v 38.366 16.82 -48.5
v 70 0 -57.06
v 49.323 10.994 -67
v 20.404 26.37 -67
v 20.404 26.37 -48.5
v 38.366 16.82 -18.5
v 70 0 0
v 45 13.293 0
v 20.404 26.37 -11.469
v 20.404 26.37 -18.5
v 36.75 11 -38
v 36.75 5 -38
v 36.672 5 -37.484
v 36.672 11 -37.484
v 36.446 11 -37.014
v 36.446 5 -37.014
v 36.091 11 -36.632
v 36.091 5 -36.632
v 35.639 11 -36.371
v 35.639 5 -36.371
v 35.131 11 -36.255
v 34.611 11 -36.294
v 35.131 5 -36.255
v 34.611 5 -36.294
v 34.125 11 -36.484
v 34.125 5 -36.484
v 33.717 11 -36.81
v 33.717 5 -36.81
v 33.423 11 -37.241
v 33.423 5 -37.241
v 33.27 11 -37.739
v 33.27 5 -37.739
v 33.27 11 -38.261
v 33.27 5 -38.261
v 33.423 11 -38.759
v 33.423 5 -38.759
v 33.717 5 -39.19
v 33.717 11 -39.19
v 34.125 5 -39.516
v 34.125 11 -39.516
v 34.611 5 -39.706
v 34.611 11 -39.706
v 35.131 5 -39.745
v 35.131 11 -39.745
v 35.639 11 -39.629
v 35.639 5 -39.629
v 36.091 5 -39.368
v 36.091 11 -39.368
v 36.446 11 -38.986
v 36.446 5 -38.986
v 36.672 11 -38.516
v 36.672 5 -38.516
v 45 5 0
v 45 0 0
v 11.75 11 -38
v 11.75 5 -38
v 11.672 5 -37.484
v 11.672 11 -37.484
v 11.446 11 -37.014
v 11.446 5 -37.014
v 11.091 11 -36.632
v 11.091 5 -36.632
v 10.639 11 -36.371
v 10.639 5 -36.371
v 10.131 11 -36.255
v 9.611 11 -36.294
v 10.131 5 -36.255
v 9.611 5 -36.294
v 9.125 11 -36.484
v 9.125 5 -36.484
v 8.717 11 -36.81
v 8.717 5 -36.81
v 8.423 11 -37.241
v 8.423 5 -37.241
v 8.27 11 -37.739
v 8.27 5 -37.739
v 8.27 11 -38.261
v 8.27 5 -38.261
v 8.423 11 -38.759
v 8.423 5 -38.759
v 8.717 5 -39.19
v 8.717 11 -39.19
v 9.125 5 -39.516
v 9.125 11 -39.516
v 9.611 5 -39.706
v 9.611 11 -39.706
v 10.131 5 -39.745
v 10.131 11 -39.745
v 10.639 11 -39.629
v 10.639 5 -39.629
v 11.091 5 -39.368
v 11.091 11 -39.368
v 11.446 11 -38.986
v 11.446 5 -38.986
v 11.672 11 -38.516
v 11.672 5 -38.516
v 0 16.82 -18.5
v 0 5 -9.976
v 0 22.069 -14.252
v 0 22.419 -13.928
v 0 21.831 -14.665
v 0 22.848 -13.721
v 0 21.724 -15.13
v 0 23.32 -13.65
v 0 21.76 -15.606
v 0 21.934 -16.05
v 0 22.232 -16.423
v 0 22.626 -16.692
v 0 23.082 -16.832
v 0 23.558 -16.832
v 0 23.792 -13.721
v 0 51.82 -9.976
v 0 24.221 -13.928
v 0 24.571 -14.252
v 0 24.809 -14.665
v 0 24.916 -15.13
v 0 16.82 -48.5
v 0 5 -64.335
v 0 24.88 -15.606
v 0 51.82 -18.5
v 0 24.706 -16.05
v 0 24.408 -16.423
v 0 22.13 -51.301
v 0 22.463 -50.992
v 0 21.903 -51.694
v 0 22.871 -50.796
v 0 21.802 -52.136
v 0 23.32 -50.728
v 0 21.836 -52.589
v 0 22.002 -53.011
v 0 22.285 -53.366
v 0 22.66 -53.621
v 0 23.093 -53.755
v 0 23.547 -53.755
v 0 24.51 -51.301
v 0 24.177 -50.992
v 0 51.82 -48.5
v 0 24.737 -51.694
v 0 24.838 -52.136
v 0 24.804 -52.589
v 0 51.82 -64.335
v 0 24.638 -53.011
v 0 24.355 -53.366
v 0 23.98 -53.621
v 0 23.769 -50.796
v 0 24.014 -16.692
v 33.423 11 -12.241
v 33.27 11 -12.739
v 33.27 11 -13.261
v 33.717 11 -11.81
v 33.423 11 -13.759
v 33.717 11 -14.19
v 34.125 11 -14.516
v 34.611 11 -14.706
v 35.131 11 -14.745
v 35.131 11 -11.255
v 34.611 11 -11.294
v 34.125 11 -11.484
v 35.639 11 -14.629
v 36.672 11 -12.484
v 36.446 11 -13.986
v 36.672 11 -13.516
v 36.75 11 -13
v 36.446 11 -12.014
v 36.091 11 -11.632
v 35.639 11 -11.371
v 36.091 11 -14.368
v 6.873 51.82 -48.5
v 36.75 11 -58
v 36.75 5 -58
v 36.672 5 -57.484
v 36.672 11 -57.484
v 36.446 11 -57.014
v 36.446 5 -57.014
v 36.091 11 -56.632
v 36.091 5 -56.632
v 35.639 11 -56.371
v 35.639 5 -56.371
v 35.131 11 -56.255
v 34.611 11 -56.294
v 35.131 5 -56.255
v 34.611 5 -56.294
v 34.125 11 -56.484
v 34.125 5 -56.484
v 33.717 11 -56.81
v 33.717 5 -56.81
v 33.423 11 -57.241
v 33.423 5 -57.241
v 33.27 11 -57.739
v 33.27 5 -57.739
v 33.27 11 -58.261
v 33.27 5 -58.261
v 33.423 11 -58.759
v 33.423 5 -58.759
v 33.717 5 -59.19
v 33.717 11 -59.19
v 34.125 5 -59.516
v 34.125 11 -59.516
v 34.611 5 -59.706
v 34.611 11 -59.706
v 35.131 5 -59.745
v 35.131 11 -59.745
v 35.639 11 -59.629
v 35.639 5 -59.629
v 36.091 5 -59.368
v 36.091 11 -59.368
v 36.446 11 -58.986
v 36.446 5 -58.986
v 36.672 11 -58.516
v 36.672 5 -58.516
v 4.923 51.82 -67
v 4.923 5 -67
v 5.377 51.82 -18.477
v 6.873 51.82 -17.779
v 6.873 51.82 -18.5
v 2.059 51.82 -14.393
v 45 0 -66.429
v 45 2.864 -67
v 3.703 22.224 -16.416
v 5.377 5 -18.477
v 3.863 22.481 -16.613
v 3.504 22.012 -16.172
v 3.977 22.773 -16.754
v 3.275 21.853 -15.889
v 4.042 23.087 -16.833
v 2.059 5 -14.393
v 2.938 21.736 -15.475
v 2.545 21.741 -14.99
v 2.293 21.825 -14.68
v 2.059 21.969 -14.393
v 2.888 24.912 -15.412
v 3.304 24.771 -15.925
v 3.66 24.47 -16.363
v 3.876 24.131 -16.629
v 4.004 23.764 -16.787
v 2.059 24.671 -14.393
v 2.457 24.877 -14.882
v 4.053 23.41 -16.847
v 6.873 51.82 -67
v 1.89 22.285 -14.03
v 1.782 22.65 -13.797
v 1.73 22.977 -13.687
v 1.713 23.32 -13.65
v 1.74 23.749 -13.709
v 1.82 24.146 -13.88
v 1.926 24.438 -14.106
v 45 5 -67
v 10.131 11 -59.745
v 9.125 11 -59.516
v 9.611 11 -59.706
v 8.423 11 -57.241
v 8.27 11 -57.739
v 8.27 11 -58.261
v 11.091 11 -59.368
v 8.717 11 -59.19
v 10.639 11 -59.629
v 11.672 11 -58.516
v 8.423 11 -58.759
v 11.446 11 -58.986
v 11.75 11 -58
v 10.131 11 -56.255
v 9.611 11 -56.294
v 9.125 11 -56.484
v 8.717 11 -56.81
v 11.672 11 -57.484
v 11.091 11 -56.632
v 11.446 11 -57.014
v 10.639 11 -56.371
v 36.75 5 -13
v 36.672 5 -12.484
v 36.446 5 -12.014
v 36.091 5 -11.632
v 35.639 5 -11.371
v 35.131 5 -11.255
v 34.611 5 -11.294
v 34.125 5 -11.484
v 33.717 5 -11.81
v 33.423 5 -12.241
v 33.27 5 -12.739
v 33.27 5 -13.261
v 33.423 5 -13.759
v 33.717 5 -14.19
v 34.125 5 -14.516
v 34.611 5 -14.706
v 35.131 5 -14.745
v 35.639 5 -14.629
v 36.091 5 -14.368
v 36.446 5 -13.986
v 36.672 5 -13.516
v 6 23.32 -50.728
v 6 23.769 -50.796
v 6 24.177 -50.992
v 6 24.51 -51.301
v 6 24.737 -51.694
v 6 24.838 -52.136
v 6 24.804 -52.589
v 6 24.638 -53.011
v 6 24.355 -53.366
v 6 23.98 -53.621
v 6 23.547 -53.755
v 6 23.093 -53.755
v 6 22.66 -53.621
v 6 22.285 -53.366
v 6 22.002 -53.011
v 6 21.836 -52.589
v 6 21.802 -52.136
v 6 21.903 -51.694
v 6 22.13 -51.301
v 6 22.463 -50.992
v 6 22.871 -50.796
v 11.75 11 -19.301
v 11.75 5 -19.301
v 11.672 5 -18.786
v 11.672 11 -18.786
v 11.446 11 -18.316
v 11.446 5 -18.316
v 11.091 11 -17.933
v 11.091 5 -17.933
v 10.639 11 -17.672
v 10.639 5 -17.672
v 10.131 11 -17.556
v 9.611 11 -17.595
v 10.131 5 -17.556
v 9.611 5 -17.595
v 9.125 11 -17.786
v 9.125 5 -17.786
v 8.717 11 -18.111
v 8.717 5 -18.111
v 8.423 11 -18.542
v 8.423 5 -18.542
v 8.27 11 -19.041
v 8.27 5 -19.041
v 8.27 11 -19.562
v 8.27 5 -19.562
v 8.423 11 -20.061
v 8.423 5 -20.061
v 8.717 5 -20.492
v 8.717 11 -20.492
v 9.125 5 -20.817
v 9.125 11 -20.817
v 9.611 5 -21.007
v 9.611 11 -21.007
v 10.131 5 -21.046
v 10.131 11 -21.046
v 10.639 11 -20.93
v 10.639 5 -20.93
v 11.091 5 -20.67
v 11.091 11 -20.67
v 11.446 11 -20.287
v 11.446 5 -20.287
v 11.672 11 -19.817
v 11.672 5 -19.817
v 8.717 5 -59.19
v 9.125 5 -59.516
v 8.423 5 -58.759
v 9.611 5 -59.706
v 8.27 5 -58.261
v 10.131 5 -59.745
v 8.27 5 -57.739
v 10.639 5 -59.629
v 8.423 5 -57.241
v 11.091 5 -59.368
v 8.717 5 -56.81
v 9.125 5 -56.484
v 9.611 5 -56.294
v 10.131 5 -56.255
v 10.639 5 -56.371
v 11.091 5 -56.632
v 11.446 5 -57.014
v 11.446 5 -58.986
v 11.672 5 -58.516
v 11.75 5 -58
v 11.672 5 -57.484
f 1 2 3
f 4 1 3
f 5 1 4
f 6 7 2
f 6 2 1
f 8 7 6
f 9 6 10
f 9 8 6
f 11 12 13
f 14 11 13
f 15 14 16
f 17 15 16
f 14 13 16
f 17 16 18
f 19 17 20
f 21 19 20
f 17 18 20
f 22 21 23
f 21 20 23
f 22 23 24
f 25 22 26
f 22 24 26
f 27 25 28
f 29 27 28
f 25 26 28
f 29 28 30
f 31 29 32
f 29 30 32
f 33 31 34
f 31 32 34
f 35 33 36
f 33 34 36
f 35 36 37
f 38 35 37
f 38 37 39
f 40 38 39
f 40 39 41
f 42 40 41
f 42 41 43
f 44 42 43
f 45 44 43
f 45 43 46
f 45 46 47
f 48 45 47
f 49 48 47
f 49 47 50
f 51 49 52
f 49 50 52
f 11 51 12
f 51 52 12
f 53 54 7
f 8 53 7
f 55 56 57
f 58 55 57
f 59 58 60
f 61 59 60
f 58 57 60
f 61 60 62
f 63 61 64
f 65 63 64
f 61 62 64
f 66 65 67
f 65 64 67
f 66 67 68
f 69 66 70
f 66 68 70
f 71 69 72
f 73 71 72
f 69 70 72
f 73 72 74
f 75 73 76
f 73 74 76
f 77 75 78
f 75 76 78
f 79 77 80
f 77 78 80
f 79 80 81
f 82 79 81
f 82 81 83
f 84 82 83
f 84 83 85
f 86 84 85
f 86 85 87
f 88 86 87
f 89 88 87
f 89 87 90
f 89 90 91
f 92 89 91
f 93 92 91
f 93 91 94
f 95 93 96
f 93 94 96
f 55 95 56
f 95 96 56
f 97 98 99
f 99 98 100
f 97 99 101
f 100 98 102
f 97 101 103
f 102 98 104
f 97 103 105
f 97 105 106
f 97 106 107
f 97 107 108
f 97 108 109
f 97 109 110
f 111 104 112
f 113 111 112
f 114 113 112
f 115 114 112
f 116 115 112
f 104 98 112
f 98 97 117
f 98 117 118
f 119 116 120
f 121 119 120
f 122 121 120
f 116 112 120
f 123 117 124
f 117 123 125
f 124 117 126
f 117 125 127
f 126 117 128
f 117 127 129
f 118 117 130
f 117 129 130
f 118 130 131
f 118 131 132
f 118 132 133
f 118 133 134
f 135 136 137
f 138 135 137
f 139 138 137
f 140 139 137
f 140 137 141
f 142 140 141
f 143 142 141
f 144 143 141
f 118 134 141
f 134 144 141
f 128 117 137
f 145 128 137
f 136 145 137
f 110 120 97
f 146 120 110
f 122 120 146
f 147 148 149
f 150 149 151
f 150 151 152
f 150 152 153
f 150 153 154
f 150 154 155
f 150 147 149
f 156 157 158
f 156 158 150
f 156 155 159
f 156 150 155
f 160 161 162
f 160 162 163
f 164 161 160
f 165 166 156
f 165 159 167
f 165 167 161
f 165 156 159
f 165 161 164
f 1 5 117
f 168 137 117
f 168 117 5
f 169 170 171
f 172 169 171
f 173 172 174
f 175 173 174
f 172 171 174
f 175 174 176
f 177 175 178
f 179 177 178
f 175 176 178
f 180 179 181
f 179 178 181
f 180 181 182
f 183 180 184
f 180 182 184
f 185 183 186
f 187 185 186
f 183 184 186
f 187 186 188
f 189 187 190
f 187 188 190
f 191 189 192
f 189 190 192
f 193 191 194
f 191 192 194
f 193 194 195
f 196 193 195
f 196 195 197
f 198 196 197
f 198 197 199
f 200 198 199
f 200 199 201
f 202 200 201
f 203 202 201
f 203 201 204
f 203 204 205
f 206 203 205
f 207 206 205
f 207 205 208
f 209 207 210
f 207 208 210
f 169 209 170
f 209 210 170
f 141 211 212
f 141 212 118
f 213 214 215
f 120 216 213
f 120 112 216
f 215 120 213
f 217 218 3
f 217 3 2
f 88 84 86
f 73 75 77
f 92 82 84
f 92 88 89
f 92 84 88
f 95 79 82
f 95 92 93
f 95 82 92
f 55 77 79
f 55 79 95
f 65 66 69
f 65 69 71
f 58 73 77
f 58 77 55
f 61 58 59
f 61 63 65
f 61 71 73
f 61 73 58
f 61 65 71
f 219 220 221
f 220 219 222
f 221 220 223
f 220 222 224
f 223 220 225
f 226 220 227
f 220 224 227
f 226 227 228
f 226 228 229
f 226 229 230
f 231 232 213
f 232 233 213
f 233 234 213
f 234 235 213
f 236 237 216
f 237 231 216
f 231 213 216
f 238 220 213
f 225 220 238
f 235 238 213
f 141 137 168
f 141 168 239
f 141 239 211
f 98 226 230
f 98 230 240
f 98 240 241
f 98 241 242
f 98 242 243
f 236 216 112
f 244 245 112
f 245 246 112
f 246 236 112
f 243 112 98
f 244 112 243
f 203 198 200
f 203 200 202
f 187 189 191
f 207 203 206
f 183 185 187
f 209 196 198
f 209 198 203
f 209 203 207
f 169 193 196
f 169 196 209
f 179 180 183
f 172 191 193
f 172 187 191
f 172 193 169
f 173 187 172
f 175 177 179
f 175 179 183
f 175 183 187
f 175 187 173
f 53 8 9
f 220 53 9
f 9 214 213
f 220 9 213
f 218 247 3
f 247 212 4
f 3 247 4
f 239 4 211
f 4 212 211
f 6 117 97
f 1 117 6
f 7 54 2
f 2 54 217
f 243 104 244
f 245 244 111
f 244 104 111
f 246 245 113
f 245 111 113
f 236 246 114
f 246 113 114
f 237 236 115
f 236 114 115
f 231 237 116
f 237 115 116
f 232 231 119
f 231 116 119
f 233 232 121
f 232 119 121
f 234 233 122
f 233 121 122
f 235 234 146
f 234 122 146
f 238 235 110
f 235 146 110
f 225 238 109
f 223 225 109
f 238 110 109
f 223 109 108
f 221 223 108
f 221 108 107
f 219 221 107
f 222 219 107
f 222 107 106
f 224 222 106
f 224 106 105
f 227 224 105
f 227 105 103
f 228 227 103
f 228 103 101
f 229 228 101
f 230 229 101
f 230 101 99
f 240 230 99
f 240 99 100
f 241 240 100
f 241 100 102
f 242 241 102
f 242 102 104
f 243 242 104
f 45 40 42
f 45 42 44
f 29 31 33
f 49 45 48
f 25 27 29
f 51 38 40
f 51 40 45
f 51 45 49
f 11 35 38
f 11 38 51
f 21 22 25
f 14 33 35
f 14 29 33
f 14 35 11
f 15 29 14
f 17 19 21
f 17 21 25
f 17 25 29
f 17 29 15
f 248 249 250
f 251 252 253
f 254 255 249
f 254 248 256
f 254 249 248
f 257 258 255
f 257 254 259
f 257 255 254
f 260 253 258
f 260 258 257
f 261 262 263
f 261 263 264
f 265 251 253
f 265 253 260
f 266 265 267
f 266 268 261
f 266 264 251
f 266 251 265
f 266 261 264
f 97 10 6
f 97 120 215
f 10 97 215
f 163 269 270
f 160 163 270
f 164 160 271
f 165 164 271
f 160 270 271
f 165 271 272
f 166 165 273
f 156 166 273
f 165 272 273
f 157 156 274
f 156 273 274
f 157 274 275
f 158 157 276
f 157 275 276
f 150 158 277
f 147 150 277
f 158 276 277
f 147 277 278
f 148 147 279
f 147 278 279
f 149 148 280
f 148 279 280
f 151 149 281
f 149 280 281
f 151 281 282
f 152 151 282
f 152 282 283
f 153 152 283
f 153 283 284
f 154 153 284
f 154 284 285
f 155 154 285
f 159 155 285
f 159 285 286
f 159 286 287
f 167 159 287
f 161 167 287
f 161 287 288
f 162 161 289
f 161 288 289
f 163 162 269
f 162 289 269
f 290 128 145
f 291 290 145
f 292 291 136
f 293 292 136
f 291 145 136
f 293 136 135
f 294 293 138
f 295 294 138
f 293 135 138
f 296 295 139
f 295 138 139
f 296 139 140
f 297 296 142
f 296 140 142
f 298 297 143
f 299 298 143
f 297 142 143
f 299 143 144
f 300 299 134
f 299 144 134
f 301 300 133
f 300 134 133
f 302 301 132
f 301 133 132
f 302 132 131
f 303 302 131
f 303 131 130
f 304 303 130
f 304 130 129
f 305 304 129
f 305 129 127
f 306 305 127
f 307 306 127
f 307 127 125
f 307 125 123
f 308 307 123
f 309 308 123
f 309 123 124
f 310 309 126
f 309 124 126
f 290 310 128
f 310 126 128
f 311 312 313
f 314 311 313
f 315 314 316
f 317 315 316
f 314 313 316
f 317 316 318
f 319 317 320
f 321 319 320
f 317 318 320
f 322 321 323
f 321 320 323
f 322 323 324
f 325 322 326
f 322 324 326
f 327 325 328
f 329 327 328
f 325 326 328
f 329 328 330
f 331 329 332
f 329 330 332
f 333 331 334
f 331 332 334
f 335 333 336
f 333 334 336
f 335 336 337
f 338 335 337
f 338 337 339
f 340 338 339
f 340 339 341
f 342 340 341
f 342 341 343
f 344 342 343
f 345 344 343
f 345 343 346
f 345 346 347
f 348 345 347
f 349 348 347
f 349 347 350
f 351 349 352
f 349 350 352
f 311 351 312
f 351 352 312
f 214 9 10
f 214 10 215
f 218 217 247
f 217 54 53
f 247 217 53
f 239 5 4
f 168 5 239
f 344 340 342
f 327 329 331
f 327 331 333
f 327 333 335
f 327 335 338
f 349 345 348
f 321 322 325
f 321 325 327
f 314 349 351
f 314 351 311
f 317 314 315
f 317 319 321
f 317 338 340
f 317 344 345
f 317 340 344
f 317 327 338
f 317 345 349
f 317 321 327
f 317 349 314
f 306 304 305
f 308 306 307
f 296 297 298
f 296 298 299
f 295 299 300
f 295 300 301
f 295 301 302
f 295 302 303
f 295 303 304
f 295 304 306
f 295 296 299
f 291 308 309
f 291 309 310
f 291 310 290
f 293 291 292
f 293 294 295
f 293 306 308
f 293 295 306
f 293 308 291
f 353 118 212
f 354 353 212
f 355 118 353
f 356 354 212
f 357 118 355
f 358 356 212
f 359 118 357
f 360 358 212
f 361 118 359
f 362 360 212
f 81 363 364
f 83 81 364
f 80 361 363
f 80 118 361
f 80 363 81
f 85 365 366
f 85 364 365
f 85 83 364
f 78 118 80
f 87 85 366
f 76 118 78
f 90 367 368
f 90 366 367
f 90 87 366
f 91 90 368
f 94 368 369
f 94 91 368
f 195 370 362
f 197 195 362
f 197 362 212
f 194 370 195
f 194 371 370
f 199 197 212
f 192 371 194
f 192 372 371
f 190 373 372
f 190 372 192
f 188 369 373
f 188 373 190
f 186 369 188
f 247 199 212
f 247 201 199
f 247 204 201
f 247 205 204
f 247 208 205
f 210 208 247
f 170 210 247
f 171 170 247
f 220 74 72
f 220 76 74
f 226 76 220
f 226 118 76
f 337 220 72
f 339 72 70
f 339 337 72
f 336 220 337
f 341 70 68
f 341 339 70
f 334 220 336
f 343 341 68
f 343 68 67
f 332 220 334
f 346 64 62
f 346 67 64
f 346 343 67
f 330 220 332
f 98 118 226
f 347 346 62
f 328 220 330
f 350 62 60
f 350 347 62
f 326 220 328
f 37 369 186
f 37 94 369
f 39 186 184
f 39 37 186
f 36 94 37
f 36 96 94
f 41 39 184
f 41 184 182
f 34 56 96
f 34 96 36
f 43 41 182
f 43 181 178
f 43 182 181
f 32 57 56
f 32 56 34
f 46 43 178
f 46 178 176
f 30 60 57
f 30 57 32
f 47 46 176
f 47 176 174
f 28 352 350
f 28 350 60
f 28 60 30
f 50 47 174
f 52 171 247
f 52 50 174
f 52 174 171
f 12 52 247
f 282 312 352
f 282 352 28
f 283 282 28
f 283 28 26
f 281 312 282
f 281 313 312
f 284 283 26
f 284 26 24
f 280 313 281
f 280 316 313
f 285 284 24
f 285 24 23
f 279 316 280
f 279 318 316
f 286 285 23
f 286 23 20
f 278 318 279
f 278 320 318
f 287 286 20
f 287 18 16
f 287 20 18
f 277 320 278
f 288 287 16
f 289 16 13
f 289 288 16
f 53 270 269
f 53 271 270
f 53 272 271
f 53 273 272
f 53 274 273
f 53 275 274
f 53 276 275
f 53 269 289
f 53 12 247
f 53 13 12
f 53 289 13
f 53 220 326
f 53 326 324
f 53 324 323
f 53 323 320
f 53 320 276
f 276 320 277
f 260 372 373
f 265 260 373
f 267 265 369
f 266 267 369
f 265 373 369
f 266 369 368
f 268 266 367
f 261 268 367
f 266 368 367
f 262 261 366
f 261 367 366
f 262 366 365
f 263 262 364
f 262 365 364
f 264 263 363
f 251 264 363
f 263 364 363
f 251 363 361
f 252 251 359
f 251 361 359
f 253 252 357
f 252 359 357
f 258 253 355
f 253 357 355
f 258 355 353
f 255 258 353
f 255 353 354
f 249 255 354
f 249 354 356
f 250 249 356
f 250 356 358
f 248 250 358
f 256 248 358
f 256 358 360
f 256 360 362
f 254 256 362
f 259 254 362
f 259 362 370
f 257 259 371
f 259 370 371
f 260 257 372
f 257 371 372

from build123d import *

# Parameters (mm, degrees)
CROQUIS1_W              = 67
CROQUIS1_H              = 51.82
SALIENTE_EXTRUIR1_DEPTH = 70
CORTAR_EXTRUIR1_REACH   = 69
CROQUIS4_W              = 60
CROQUIS4_H              = 30
CORTAR_EXTRUIR2_DEPTH   = 35
CORTAR_EXTRUIR3_REACH   = 69
CROQUIS5_W              = 45
CROQUIS5_H              = 5
CORTAR_EXTRUIR4_REACH   = 53.82
CORTAR_EXTRUIR5_REACH   = 53.82
CROQUIS9_R              = 1.6
CROQUIS9_R_2            = 1.522094027
CORTAR_EXTRUIR6_DEPTH   = 6
CROQUIS11_R             = 1.75
CORTAR_EXTRUIR7_DEPTH   = 6
CORTAR_EXTRUIR8_REACH   = 34.863


with BuildPart() as part:
    # Croquis1 → Saliente-Extruir1 (new body)
    with BuildSketch(Plane(origin=(0, 0, 0), x_dir=(0, 0, -1), z_dir=(1, 0, 0))):
        with Locations((33.5, 25.91)):
            Rectangle(CROQUIS1_W, CROQUIS1_H)
    extrude(amount=SALIENTE_EXTRUIR1_DEPTH)

    # Croquis3 → Cortar-Extruir1 (cut, up to next)
    with BuildSketch(Plane.XY, mode=Mode.PRIVATE) as cortar_extruir1_sk1:
        Polygon((70, 0), (20.404370982, 26.370463718), (6.872612509, 51.82), (70, 51.82), align=None)
    cortar_extruir1_tool1 = extrude(cortar_extruir1_sk1.sketch, amount=-CORTAR_EXTRUIR1_REACH, mode=Mode.PRIVATE) & part.part
    add(cortar_extruir1_tool1.solids().sort_by_distance((45.373987, 32.707801, 0))[0], mode=Mode.SUBTRACT)

    # Croquis4 → Cortar-Extruir2 (cut)
    with BuildSketch(Plane(origin=(0, 51.82, 0), x_dir=(1, 0, 0), z_dir=(0, 1, 0))):
        with Locations((30, 33.5)):
            Rectangle(CROQUIS4_W, CROQUIS4_H)
    extrude(amount=-CORTAR_EXTRUIR2_DEPTH, mode=Mode.SUBTRACT)

    # Croquis5 → Cortar-Extruir3 (cut, up to next)
    with BuildSketch(Plane.XY, mode=Mode.PRIVATE) as cortar_extruir3_sk1:
        with Locations((22.5, 2.5)):
            Rectangle(CROQUIS5_W, CROQUIS5_H)
    cortar_extruir3_tool1 = extrude(cortar_extruir3_sk1.sketch, amount=-CORTAR_EXTRUIR3_REACH, mode=Mode.PRIVATE) & part.part
    add(cortar_extruir3_tool1.solids().sort_by_distance((22.5, 2.5, 0))[0], mode=Mode.SUBTRACT)

    # Croquis6 → Cortar-Extruir4 (cut, up to next)
    with BuildSketch(Plane(origin=(0, 51.82, 0), x_dir=(1, 0, 0), z_dir=(0, 1, 0)), mode=Mode.PRIVATE) as cortar_extruir4_sk1:
        Polygon((4.922856145, 67), (0, 64.334655313), (0, 67), align=None)
    cortar_extruir4_tool1 = extrude(cortar_extruir4_sk1.sketch, amount=-CORTAR_EXTRUIR4_REACH, mode=Mode.PRIVATE) & part.part
    add(cortar_extruir4_tool1.solids().sort_by_distance((1.640952, 51.82, -66.111552))[0], mode=Mode.SUBTRACT)

    # Croquis8 → Cortar-Extruir5 (cut, up to next)
    with BuildSketch(Plane(origin=(0, 51.82, 0), x_dir=(1, 0, 0), z_dir=(0, 1, 0)), mode=Mode.PRIVATE) as cortar_extruir5_sk1:
        Polygon((45, 0), (5.376842989, 18.476581555), (2.059345913, 14.392541381), (0, 9.976259819), (0, -0.062203445), (6.872612509, 0), (20.404370982, 0), align=None)
    cortar_extruir5_tool1 = extrude(cortar_extruir5_sk1.sketch, amount=-CORTAR_EXTRUIR5_REACH, mode=Mode.PRIVATE) & part.part
    add(cortar_extruir5_tool1.solids().sort_by_distance((15.782883, 51.82, -6.412773))[0], mode=Mode.SUBTRACT)

    # Croquis9 → Cortar-Extruir6 (cut)
    with BuildSketch(Plane.ZY):
        with Locations((-15.25, 23.32)):
            Circle(CROQUIS9_R)
        with Locations((-52.25, 23.32)):
            Circle(CROQUIS9_R_2)
    extrude(amount=-CORTAR_EXTRUIR6_DEPTH, mode=Mode.SUBTRACT)

    # Croquis11 → Cortar-Extruir7 (cut)
    with BuildSketch(Plane.XZ.offset(-5)):
        with Locations((35, -58)):
            Circle(CROQUIS11_R)
        with Locations((10, -58)):
            Circle(CROQUIS11_R)
        with Locations((10, -38)):
            Circle(CROQUIS11_R)
        with Locations((35, -38)):
            Circle(CROQUIS11_R)
        with Locations((10, -19.30137405)):
            Circle(CROQUIS11_R)
        with Locations((35, -13)):
            Circle(CROQUIS11_R)
    extrude(amount=-CORTAR_EXTRUIR7_DEPTH, mode=Mode.SUBTRACT)

    # Croquis13 → Cortar-Extruir8 (cut, up to next)
    with BuildSketch(Plane(origin=(15.428248379, 29.016315039, 0), x_dir=(0.882947593, -0.469471563, 0), z_dir=(0.469471563, 0.882947593, 0)), mode=Mode.PRIVATE) as cortar_extruir8_sk1:
        Polygon((34.467850213, 68.66403013), (75.183132097, 51.381418335), (75.183132097, 68.66403013), align=None)
    cortar_extruir8_tool1 = extrude(cortar_extruir8_sk1.sketch, amount=-CORTAR_EXTRUIR8_REACH, mode=Mode.PRIVATE) & part.part
    add(cortar_extruir8_tool1.solids().sort_by_distance((69.827861, 0.091528, -62.90316))[0], mode=Mode.SUBTRACT)


solid = part.part
